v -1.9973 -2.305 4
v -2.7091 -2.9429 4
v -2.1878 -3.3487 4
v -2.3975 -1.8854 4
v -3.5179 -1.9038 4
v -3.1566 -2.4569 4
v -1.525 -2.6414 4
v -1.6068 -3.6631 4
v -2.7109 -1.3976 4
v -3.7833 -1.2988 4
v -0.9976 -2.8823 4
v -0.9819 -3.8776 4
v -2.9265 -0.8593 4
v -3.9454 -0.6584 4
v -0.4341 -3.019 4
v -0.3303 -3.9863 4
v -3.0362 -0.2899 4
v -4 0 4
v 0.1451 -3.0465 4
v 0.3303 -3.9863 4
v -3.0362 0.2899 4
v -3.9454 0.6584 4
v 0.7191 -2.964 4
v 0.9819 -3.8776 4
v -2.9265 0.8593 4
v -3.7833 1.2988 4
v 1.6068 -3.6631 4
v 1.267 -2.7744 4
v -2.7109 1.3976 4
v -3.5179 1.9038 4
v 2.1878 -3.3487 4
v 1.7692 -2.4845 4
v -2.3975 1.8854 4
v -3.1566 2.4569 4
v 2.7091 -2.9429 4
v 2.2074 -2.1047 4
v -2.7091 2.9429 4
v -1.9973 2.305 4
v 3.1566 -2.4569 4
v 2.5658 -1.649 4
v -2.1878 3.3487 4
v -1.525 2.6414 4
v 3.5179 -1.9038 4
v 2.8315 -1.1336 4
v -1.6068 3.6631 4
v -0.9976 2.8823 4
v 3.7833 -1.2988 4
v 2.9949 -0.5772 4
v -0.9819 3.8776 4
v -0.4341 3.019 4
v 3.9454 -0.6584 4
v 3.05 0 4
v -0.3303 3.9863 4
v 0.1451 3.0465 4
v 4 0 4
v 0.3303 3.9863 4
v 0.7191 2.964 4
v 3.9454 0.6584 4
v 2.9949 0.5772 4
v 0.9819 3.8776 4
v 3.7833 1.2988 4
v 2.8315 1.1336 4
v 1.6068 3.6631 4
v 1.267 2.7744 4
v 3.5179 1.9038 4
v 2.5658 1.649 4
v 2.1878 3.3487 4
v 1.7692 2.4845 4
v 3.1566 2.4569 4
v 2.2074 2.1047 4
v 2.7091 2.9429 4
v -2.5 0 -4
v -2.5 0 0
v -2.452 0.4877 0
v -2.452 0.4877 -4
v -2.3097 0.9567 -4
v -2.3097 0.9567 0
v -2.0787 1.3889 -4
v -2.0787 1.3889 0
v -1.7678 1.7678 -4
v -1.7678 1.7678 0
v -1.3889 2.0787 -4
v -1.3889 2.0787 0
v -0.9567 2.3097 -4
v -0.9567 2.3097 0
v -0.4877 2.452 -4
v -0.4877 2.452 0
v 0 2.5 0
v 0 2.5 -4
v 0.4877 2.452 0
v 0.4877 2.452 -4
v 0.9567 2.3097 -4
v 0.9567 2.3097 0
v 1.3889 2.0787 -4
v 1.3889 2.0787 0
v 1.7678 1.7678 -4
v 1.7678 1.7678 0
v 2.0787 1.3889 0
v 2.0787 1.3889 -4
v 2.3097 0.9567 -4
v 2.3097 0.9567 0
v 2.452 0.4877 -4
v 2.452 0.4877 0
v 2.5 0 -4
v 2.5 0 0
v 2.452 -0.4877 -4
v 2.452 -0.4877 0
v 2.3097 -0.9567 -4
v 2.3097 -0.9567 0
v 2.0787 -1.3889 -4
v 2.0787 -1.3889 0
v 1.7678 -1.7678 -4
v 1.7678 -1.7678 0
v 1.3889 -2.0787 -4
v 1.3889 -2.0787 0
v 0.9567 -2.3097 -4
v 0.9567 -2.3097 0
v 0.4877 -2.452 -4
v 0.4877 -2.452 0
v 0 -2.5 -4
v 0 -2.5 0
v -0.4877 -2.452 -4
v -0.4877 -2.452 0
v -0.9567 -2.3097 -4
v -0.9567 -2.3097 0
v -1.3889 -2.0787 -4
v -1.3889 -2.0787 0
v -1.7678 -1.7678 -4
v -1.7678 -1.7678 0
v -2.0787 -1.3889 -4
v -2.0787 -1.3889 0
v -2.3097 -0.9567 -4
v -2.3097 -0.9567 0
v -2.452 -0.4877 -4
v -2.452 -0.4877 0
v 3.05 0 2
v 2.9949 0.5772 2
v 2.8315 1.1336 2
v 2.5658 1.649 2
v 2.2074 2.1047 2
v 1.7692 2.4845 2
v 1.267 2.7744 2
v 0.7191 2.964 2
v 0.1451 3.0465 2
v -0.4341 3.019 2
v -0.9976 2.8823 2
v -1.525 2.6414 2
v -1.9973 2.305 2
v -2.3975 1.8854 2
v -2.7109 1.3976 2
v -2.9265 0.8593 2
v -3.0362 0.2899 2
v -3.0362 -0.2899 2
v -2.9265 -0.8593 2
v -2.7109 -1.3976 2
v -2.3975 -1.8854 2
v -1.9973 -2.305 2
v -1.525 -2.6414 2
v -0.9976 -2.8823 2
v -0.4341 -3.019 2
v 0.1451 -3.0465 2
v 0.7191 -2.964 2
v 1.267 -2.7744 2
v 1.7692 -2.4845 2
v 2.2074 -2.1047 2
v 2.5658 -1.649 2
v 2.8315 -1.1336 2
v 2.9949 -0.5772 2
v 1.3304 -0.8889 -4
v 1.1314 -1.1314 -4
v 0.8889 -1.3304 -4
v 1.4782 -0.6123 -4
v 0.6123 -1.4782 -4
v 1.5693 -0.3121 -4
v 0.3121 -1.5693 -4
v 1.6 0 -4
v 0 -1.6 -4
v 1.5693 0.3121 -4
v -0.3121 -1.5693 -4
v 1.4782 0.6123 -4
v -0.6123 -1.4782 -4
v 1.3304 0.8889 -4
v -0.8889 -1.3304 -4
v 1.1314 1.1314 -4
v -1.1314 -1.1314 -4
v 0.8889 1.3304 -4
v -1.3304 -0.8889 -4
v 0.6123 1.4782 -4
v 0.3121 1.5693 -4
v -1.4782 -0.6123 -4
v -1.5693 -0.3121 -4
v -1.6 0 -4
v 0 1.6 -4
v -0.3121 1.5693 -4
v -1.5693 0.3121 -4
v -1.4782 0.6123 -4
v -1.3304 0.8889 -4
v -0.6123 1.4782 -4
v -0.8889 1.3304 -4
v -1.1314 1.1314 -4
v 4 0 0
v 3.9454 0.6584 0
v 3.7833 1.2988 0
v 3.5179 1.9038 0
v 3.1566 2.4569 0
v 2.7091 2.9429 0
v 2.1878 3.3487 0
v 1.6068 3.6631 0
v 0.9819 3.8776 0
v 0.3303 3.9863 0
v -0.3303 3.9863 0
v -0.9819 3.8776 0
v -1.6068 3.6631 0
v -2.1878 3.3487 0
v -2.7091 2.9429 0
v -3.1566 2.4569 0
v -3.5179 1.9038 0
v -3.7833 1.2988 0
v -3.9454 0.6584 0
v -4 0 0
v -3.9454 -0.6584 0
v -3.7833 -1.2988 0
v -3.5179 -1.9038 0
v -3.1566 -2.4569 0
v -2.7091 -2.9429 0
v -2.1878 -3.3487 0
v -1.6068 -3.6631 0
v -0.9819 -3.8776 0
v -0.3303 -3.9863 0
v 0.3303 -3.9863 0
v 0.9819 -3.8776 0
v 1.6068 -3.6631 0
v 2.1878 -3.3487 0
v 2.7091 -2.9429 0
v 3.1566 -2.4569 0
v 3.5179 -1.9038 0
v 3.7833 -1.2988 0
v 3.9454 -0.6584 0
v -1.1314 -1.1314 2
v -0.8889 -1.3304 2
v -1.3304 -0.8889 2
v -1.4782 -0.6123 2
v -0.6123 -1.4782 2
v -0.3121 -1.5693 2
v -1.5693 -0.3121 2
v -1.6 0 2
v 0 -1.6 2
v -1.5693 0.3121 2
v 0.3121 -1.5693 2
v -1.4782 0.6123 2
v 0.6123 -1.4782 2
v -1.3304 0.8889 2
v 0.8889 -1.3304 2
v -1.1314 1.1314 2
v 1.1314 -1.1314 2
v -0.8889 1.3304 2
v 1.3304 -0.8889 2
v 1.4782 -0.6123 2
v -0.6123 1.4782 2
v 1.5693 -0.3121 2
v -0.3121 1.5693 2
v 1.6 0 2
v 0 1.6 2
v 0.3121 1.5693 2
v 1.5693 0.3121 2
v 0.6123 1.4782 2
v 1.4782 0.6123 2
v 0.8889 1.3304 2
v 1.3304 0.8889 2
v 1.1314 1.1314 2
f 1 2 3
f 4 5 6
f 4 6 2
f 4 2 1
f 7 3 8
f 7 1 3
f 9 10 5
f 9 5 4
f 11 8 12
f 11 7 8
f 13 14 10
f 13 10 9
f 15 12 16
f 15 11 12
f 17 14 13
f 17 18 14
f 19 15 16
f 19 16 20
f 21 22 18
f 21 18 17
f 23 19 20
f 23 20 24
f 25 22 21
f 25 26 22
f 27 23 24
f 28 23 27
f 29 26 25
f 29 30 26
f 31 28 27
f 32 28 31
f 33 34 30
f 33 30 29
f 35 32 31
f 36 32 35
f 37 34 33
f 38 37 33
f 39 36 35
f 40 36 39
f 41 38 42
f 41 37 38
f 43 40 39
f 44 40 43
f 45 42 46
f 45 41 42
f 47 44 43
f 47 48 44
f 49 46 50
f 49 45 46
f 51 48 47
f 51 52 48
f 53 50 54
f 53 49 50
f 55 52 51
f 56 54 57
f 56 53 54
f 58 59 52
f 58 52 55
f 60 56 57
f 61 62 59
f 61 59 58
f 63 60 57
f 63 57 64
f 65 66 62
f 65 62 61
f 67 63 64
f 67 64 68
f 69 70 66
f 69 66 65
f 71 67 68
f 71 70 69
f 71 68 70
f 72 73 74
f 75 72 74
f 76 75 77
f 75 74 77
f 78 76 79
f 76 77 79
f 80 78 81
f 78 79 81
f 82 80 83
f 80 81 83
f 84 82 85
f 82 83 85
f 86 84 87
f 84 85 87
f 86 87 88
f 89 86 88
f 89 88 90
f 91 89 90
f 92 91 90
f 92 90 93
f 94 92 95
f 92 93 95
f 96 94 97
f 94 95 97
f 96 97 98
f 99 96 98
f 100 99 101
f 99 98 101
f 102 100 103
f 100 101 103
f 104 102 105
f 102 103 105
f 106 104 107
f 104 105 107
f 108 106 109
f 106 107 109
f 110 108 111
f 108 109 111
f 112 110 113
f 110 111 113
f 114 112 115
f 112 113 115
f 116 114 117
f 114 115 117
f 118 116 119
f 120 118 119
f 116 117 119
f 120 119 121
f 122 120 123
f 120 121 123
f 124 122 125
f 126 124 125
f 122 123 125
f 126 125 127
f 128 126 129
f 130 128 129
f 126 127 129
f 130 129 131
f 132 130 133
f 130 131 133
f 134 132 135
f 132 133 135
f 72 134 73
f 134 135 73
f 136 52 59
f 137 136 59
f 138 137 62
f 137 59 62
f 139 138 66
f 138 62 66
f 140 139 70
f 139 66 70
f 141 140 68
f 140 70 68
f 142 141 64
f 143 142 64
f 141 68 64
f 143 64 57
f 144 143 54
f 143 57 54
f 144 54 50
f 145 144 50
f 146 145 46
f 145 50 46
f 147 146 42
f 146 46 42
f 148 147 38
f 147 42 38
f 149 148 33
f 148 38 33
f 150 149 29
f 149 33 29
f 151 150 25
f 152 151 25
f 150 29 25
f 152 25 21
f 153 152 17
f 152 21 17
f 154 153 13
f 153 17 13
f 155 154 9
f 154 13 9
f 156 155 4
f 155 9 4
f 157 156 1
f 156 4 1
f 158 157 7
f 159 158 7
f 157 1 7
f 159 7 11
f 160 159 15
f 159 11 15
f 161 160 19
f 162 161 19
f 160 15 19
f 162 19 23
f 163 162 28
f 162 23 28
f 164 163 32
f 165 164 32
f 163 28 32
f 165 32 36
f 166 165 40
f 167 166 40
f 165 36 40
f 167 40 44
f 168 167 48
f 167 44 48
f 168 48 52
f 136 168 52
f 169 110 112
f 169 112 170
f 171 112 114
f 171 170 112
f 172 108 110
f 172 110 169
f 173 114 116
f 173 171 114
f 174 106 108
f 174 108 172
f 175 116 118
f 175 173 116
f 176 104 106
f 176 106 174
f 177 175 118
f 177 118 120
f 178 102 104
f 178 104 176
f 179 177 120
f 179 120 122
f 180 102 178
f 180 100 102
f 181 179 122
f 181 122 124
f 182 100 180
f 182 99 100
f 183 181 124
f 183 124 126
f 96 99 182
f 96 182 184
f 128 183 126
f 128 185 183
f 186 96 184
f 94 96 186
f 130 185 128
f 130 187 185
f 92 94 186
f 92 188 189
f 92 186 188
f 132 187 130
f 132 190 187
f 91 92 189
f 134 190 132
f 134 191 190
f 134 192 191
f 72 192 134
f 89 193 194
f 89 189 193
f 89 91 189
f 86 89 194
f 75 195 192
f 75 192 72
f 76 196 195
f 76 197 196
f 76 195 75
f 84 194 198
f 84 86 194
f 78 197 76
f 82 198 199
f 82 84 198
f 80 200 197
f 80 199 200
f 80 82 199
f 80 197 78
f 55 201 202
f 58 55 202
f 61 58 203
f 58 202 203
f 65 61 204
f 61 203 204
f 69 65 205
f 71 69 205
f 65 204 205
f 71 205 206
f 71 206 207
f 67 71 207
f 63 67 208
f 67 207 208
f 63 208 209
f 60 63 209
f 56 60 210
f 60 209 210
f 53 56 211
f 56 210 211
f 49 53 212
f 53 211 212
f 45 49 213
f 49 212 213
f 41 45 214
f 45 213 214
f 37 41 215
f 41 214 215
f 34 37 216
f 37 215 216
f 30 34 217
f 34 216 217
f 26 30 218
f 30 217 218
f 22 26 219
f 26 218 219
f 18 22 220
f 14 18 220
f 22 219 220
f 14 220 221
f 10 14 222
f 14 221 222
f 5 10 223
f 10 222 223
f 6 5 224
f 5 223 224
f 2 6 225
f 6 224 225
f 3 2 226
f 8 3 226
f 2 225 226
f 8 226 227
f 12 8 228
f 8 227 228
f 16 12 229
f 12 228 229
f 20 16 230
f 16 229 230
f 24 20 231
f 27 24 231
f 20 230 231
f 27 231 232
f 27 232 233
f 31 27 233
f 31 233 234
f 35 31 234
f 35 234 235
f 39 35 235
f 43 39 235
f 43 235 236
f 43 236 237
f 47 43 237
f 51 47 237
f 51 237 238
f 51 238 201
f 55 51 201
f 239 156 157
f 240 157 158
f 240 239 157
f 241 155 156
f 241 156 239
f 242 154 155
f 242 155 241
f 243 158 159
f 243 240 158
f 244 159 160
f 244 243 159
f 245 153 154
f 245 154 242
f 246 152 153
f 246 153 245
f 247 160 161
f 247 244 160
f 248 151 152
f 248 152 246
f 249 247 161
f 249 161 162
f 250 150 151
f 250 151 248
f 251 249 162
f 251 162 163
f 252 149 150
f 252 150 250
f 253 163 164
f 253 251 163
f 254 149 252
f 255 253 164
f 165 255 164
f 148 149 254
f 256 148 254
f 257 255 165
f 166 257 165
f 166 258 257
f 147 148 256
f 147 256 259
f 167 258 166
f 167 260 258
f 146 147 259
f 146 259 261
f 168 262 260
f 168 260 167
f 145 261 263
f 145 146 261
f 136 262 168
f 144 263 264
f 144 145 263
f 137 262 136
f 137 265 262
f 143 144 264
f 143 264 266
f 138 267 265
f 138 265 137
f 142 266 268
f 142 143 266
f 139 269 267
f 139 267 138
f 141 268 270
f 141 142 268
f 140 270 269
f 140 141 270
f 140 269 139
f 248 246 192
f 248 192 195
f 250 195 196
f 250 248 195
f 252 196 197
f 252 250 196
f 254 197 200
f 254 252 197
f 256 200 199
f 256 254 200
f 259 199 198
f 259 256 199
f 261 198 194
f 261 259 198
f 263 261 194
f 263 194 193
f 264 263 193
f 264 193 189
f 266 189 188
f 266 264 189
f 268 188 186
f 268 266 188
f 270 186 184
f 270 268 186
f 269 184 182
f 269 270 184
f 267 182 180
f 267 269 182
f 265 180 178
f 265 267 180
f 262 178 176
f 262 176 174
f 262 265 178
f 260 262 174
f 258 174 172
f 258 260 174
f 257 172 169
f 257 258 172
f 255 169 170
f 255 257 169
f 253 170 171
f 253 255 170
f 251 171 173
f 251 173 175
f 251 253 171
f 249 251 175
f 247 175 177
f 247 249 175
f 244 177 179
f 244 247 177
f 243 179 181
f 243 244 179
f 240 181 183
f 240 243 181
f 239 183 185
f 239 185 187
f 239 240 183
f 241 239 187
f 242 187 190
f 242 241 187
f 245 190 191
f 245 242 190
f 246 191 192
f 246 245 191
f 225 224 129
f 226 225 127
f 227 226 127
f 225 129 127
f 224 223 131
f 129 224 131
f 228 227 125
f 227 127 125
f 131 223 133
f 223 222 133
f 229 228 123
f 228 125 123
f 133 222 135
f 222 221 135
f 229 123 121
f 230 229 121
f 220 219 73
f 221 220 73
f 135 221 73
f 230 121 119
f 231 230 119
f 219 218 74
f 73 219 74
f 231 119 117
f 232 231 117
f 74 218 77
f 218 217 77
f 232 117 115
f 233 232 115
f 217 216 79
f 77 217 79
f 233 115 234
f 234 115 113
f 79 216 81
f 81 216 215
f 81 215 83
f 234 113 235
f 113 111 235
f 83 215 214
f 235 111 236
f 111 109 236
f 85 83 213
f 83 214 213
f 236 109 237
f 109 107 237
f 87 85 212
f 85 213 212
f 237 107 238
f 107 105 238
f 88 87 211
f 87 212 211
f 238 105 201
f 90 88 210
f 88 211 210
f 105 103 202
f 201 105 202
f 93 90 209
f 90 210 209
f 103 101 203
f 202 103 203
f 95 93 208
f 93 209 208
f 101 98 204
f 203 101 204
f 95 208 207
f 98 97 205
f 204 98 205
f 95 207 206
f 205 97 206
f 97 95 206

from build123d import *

# Parameters (mm, degrees)
SKETCH_1_R               = 4
EXTRUDE_1_DEPTH          = 4
SKETCH_4_R               = 2.5
EXTRUDE_2_DEPTH          = 4
SKETCH_2_R               = 1.6
CUT_EXTRUDE_1_DEPTH      = 4
CUT_EXTRUDE_1_DEPTH_BACK = 3
SKETCH_3_R               = 3.05
CUT_EXTRUDE_2_DEPTH      = 2


with BuildPart() as part:
    # 草图1 → 凸台-拉伸1 (new body)
    with BuildSketch(Plane.XY):
        Circle(SKETCH_1_R)
    extrude(amount=EXTRUDE_1_DEPTH)

    # 草图4 → 凸台-拉伸2 (add)
    with BuildSketch(Plane(origin=(0, 0, 0), x_dir=(-1, 0, 0), z_dir=(0, 0, -1))):
        Circle(SKETCH_4_R)
    extrude(amount=EXTRUDE_2_DEPTH)

    # 草图2 → 切除-拉伸1 (cut, two sides)
    with BuildSketch(Plane(origin=(0, 0, 0), x_dir=(-1, 0, 0), z_dir=(0, 0, -1))) as cut_extrude_1_sk:
        Circle(SKETCH_2_R)
    extrude(amount=CUT_EXTRUDE_1_DEPTH, mode=Mode.SUBTRACT)
    extrude(cut_extrude_1_sk.sketch, amount=-CUT_EXTRUDE_1_DEPTH_BACK, mode=Mode.SUBTRACT)

    # 草图3 → 切除-拉伸2 (cut)
    with BuildSketch(Plane.XY.offset(4)):
        Circle(SKETCH_3_R)
    extrude(amount=-CUT_EXTRUDE_2_DEPTH, mode=Mode.SUBTRACT)


solid = part.part
